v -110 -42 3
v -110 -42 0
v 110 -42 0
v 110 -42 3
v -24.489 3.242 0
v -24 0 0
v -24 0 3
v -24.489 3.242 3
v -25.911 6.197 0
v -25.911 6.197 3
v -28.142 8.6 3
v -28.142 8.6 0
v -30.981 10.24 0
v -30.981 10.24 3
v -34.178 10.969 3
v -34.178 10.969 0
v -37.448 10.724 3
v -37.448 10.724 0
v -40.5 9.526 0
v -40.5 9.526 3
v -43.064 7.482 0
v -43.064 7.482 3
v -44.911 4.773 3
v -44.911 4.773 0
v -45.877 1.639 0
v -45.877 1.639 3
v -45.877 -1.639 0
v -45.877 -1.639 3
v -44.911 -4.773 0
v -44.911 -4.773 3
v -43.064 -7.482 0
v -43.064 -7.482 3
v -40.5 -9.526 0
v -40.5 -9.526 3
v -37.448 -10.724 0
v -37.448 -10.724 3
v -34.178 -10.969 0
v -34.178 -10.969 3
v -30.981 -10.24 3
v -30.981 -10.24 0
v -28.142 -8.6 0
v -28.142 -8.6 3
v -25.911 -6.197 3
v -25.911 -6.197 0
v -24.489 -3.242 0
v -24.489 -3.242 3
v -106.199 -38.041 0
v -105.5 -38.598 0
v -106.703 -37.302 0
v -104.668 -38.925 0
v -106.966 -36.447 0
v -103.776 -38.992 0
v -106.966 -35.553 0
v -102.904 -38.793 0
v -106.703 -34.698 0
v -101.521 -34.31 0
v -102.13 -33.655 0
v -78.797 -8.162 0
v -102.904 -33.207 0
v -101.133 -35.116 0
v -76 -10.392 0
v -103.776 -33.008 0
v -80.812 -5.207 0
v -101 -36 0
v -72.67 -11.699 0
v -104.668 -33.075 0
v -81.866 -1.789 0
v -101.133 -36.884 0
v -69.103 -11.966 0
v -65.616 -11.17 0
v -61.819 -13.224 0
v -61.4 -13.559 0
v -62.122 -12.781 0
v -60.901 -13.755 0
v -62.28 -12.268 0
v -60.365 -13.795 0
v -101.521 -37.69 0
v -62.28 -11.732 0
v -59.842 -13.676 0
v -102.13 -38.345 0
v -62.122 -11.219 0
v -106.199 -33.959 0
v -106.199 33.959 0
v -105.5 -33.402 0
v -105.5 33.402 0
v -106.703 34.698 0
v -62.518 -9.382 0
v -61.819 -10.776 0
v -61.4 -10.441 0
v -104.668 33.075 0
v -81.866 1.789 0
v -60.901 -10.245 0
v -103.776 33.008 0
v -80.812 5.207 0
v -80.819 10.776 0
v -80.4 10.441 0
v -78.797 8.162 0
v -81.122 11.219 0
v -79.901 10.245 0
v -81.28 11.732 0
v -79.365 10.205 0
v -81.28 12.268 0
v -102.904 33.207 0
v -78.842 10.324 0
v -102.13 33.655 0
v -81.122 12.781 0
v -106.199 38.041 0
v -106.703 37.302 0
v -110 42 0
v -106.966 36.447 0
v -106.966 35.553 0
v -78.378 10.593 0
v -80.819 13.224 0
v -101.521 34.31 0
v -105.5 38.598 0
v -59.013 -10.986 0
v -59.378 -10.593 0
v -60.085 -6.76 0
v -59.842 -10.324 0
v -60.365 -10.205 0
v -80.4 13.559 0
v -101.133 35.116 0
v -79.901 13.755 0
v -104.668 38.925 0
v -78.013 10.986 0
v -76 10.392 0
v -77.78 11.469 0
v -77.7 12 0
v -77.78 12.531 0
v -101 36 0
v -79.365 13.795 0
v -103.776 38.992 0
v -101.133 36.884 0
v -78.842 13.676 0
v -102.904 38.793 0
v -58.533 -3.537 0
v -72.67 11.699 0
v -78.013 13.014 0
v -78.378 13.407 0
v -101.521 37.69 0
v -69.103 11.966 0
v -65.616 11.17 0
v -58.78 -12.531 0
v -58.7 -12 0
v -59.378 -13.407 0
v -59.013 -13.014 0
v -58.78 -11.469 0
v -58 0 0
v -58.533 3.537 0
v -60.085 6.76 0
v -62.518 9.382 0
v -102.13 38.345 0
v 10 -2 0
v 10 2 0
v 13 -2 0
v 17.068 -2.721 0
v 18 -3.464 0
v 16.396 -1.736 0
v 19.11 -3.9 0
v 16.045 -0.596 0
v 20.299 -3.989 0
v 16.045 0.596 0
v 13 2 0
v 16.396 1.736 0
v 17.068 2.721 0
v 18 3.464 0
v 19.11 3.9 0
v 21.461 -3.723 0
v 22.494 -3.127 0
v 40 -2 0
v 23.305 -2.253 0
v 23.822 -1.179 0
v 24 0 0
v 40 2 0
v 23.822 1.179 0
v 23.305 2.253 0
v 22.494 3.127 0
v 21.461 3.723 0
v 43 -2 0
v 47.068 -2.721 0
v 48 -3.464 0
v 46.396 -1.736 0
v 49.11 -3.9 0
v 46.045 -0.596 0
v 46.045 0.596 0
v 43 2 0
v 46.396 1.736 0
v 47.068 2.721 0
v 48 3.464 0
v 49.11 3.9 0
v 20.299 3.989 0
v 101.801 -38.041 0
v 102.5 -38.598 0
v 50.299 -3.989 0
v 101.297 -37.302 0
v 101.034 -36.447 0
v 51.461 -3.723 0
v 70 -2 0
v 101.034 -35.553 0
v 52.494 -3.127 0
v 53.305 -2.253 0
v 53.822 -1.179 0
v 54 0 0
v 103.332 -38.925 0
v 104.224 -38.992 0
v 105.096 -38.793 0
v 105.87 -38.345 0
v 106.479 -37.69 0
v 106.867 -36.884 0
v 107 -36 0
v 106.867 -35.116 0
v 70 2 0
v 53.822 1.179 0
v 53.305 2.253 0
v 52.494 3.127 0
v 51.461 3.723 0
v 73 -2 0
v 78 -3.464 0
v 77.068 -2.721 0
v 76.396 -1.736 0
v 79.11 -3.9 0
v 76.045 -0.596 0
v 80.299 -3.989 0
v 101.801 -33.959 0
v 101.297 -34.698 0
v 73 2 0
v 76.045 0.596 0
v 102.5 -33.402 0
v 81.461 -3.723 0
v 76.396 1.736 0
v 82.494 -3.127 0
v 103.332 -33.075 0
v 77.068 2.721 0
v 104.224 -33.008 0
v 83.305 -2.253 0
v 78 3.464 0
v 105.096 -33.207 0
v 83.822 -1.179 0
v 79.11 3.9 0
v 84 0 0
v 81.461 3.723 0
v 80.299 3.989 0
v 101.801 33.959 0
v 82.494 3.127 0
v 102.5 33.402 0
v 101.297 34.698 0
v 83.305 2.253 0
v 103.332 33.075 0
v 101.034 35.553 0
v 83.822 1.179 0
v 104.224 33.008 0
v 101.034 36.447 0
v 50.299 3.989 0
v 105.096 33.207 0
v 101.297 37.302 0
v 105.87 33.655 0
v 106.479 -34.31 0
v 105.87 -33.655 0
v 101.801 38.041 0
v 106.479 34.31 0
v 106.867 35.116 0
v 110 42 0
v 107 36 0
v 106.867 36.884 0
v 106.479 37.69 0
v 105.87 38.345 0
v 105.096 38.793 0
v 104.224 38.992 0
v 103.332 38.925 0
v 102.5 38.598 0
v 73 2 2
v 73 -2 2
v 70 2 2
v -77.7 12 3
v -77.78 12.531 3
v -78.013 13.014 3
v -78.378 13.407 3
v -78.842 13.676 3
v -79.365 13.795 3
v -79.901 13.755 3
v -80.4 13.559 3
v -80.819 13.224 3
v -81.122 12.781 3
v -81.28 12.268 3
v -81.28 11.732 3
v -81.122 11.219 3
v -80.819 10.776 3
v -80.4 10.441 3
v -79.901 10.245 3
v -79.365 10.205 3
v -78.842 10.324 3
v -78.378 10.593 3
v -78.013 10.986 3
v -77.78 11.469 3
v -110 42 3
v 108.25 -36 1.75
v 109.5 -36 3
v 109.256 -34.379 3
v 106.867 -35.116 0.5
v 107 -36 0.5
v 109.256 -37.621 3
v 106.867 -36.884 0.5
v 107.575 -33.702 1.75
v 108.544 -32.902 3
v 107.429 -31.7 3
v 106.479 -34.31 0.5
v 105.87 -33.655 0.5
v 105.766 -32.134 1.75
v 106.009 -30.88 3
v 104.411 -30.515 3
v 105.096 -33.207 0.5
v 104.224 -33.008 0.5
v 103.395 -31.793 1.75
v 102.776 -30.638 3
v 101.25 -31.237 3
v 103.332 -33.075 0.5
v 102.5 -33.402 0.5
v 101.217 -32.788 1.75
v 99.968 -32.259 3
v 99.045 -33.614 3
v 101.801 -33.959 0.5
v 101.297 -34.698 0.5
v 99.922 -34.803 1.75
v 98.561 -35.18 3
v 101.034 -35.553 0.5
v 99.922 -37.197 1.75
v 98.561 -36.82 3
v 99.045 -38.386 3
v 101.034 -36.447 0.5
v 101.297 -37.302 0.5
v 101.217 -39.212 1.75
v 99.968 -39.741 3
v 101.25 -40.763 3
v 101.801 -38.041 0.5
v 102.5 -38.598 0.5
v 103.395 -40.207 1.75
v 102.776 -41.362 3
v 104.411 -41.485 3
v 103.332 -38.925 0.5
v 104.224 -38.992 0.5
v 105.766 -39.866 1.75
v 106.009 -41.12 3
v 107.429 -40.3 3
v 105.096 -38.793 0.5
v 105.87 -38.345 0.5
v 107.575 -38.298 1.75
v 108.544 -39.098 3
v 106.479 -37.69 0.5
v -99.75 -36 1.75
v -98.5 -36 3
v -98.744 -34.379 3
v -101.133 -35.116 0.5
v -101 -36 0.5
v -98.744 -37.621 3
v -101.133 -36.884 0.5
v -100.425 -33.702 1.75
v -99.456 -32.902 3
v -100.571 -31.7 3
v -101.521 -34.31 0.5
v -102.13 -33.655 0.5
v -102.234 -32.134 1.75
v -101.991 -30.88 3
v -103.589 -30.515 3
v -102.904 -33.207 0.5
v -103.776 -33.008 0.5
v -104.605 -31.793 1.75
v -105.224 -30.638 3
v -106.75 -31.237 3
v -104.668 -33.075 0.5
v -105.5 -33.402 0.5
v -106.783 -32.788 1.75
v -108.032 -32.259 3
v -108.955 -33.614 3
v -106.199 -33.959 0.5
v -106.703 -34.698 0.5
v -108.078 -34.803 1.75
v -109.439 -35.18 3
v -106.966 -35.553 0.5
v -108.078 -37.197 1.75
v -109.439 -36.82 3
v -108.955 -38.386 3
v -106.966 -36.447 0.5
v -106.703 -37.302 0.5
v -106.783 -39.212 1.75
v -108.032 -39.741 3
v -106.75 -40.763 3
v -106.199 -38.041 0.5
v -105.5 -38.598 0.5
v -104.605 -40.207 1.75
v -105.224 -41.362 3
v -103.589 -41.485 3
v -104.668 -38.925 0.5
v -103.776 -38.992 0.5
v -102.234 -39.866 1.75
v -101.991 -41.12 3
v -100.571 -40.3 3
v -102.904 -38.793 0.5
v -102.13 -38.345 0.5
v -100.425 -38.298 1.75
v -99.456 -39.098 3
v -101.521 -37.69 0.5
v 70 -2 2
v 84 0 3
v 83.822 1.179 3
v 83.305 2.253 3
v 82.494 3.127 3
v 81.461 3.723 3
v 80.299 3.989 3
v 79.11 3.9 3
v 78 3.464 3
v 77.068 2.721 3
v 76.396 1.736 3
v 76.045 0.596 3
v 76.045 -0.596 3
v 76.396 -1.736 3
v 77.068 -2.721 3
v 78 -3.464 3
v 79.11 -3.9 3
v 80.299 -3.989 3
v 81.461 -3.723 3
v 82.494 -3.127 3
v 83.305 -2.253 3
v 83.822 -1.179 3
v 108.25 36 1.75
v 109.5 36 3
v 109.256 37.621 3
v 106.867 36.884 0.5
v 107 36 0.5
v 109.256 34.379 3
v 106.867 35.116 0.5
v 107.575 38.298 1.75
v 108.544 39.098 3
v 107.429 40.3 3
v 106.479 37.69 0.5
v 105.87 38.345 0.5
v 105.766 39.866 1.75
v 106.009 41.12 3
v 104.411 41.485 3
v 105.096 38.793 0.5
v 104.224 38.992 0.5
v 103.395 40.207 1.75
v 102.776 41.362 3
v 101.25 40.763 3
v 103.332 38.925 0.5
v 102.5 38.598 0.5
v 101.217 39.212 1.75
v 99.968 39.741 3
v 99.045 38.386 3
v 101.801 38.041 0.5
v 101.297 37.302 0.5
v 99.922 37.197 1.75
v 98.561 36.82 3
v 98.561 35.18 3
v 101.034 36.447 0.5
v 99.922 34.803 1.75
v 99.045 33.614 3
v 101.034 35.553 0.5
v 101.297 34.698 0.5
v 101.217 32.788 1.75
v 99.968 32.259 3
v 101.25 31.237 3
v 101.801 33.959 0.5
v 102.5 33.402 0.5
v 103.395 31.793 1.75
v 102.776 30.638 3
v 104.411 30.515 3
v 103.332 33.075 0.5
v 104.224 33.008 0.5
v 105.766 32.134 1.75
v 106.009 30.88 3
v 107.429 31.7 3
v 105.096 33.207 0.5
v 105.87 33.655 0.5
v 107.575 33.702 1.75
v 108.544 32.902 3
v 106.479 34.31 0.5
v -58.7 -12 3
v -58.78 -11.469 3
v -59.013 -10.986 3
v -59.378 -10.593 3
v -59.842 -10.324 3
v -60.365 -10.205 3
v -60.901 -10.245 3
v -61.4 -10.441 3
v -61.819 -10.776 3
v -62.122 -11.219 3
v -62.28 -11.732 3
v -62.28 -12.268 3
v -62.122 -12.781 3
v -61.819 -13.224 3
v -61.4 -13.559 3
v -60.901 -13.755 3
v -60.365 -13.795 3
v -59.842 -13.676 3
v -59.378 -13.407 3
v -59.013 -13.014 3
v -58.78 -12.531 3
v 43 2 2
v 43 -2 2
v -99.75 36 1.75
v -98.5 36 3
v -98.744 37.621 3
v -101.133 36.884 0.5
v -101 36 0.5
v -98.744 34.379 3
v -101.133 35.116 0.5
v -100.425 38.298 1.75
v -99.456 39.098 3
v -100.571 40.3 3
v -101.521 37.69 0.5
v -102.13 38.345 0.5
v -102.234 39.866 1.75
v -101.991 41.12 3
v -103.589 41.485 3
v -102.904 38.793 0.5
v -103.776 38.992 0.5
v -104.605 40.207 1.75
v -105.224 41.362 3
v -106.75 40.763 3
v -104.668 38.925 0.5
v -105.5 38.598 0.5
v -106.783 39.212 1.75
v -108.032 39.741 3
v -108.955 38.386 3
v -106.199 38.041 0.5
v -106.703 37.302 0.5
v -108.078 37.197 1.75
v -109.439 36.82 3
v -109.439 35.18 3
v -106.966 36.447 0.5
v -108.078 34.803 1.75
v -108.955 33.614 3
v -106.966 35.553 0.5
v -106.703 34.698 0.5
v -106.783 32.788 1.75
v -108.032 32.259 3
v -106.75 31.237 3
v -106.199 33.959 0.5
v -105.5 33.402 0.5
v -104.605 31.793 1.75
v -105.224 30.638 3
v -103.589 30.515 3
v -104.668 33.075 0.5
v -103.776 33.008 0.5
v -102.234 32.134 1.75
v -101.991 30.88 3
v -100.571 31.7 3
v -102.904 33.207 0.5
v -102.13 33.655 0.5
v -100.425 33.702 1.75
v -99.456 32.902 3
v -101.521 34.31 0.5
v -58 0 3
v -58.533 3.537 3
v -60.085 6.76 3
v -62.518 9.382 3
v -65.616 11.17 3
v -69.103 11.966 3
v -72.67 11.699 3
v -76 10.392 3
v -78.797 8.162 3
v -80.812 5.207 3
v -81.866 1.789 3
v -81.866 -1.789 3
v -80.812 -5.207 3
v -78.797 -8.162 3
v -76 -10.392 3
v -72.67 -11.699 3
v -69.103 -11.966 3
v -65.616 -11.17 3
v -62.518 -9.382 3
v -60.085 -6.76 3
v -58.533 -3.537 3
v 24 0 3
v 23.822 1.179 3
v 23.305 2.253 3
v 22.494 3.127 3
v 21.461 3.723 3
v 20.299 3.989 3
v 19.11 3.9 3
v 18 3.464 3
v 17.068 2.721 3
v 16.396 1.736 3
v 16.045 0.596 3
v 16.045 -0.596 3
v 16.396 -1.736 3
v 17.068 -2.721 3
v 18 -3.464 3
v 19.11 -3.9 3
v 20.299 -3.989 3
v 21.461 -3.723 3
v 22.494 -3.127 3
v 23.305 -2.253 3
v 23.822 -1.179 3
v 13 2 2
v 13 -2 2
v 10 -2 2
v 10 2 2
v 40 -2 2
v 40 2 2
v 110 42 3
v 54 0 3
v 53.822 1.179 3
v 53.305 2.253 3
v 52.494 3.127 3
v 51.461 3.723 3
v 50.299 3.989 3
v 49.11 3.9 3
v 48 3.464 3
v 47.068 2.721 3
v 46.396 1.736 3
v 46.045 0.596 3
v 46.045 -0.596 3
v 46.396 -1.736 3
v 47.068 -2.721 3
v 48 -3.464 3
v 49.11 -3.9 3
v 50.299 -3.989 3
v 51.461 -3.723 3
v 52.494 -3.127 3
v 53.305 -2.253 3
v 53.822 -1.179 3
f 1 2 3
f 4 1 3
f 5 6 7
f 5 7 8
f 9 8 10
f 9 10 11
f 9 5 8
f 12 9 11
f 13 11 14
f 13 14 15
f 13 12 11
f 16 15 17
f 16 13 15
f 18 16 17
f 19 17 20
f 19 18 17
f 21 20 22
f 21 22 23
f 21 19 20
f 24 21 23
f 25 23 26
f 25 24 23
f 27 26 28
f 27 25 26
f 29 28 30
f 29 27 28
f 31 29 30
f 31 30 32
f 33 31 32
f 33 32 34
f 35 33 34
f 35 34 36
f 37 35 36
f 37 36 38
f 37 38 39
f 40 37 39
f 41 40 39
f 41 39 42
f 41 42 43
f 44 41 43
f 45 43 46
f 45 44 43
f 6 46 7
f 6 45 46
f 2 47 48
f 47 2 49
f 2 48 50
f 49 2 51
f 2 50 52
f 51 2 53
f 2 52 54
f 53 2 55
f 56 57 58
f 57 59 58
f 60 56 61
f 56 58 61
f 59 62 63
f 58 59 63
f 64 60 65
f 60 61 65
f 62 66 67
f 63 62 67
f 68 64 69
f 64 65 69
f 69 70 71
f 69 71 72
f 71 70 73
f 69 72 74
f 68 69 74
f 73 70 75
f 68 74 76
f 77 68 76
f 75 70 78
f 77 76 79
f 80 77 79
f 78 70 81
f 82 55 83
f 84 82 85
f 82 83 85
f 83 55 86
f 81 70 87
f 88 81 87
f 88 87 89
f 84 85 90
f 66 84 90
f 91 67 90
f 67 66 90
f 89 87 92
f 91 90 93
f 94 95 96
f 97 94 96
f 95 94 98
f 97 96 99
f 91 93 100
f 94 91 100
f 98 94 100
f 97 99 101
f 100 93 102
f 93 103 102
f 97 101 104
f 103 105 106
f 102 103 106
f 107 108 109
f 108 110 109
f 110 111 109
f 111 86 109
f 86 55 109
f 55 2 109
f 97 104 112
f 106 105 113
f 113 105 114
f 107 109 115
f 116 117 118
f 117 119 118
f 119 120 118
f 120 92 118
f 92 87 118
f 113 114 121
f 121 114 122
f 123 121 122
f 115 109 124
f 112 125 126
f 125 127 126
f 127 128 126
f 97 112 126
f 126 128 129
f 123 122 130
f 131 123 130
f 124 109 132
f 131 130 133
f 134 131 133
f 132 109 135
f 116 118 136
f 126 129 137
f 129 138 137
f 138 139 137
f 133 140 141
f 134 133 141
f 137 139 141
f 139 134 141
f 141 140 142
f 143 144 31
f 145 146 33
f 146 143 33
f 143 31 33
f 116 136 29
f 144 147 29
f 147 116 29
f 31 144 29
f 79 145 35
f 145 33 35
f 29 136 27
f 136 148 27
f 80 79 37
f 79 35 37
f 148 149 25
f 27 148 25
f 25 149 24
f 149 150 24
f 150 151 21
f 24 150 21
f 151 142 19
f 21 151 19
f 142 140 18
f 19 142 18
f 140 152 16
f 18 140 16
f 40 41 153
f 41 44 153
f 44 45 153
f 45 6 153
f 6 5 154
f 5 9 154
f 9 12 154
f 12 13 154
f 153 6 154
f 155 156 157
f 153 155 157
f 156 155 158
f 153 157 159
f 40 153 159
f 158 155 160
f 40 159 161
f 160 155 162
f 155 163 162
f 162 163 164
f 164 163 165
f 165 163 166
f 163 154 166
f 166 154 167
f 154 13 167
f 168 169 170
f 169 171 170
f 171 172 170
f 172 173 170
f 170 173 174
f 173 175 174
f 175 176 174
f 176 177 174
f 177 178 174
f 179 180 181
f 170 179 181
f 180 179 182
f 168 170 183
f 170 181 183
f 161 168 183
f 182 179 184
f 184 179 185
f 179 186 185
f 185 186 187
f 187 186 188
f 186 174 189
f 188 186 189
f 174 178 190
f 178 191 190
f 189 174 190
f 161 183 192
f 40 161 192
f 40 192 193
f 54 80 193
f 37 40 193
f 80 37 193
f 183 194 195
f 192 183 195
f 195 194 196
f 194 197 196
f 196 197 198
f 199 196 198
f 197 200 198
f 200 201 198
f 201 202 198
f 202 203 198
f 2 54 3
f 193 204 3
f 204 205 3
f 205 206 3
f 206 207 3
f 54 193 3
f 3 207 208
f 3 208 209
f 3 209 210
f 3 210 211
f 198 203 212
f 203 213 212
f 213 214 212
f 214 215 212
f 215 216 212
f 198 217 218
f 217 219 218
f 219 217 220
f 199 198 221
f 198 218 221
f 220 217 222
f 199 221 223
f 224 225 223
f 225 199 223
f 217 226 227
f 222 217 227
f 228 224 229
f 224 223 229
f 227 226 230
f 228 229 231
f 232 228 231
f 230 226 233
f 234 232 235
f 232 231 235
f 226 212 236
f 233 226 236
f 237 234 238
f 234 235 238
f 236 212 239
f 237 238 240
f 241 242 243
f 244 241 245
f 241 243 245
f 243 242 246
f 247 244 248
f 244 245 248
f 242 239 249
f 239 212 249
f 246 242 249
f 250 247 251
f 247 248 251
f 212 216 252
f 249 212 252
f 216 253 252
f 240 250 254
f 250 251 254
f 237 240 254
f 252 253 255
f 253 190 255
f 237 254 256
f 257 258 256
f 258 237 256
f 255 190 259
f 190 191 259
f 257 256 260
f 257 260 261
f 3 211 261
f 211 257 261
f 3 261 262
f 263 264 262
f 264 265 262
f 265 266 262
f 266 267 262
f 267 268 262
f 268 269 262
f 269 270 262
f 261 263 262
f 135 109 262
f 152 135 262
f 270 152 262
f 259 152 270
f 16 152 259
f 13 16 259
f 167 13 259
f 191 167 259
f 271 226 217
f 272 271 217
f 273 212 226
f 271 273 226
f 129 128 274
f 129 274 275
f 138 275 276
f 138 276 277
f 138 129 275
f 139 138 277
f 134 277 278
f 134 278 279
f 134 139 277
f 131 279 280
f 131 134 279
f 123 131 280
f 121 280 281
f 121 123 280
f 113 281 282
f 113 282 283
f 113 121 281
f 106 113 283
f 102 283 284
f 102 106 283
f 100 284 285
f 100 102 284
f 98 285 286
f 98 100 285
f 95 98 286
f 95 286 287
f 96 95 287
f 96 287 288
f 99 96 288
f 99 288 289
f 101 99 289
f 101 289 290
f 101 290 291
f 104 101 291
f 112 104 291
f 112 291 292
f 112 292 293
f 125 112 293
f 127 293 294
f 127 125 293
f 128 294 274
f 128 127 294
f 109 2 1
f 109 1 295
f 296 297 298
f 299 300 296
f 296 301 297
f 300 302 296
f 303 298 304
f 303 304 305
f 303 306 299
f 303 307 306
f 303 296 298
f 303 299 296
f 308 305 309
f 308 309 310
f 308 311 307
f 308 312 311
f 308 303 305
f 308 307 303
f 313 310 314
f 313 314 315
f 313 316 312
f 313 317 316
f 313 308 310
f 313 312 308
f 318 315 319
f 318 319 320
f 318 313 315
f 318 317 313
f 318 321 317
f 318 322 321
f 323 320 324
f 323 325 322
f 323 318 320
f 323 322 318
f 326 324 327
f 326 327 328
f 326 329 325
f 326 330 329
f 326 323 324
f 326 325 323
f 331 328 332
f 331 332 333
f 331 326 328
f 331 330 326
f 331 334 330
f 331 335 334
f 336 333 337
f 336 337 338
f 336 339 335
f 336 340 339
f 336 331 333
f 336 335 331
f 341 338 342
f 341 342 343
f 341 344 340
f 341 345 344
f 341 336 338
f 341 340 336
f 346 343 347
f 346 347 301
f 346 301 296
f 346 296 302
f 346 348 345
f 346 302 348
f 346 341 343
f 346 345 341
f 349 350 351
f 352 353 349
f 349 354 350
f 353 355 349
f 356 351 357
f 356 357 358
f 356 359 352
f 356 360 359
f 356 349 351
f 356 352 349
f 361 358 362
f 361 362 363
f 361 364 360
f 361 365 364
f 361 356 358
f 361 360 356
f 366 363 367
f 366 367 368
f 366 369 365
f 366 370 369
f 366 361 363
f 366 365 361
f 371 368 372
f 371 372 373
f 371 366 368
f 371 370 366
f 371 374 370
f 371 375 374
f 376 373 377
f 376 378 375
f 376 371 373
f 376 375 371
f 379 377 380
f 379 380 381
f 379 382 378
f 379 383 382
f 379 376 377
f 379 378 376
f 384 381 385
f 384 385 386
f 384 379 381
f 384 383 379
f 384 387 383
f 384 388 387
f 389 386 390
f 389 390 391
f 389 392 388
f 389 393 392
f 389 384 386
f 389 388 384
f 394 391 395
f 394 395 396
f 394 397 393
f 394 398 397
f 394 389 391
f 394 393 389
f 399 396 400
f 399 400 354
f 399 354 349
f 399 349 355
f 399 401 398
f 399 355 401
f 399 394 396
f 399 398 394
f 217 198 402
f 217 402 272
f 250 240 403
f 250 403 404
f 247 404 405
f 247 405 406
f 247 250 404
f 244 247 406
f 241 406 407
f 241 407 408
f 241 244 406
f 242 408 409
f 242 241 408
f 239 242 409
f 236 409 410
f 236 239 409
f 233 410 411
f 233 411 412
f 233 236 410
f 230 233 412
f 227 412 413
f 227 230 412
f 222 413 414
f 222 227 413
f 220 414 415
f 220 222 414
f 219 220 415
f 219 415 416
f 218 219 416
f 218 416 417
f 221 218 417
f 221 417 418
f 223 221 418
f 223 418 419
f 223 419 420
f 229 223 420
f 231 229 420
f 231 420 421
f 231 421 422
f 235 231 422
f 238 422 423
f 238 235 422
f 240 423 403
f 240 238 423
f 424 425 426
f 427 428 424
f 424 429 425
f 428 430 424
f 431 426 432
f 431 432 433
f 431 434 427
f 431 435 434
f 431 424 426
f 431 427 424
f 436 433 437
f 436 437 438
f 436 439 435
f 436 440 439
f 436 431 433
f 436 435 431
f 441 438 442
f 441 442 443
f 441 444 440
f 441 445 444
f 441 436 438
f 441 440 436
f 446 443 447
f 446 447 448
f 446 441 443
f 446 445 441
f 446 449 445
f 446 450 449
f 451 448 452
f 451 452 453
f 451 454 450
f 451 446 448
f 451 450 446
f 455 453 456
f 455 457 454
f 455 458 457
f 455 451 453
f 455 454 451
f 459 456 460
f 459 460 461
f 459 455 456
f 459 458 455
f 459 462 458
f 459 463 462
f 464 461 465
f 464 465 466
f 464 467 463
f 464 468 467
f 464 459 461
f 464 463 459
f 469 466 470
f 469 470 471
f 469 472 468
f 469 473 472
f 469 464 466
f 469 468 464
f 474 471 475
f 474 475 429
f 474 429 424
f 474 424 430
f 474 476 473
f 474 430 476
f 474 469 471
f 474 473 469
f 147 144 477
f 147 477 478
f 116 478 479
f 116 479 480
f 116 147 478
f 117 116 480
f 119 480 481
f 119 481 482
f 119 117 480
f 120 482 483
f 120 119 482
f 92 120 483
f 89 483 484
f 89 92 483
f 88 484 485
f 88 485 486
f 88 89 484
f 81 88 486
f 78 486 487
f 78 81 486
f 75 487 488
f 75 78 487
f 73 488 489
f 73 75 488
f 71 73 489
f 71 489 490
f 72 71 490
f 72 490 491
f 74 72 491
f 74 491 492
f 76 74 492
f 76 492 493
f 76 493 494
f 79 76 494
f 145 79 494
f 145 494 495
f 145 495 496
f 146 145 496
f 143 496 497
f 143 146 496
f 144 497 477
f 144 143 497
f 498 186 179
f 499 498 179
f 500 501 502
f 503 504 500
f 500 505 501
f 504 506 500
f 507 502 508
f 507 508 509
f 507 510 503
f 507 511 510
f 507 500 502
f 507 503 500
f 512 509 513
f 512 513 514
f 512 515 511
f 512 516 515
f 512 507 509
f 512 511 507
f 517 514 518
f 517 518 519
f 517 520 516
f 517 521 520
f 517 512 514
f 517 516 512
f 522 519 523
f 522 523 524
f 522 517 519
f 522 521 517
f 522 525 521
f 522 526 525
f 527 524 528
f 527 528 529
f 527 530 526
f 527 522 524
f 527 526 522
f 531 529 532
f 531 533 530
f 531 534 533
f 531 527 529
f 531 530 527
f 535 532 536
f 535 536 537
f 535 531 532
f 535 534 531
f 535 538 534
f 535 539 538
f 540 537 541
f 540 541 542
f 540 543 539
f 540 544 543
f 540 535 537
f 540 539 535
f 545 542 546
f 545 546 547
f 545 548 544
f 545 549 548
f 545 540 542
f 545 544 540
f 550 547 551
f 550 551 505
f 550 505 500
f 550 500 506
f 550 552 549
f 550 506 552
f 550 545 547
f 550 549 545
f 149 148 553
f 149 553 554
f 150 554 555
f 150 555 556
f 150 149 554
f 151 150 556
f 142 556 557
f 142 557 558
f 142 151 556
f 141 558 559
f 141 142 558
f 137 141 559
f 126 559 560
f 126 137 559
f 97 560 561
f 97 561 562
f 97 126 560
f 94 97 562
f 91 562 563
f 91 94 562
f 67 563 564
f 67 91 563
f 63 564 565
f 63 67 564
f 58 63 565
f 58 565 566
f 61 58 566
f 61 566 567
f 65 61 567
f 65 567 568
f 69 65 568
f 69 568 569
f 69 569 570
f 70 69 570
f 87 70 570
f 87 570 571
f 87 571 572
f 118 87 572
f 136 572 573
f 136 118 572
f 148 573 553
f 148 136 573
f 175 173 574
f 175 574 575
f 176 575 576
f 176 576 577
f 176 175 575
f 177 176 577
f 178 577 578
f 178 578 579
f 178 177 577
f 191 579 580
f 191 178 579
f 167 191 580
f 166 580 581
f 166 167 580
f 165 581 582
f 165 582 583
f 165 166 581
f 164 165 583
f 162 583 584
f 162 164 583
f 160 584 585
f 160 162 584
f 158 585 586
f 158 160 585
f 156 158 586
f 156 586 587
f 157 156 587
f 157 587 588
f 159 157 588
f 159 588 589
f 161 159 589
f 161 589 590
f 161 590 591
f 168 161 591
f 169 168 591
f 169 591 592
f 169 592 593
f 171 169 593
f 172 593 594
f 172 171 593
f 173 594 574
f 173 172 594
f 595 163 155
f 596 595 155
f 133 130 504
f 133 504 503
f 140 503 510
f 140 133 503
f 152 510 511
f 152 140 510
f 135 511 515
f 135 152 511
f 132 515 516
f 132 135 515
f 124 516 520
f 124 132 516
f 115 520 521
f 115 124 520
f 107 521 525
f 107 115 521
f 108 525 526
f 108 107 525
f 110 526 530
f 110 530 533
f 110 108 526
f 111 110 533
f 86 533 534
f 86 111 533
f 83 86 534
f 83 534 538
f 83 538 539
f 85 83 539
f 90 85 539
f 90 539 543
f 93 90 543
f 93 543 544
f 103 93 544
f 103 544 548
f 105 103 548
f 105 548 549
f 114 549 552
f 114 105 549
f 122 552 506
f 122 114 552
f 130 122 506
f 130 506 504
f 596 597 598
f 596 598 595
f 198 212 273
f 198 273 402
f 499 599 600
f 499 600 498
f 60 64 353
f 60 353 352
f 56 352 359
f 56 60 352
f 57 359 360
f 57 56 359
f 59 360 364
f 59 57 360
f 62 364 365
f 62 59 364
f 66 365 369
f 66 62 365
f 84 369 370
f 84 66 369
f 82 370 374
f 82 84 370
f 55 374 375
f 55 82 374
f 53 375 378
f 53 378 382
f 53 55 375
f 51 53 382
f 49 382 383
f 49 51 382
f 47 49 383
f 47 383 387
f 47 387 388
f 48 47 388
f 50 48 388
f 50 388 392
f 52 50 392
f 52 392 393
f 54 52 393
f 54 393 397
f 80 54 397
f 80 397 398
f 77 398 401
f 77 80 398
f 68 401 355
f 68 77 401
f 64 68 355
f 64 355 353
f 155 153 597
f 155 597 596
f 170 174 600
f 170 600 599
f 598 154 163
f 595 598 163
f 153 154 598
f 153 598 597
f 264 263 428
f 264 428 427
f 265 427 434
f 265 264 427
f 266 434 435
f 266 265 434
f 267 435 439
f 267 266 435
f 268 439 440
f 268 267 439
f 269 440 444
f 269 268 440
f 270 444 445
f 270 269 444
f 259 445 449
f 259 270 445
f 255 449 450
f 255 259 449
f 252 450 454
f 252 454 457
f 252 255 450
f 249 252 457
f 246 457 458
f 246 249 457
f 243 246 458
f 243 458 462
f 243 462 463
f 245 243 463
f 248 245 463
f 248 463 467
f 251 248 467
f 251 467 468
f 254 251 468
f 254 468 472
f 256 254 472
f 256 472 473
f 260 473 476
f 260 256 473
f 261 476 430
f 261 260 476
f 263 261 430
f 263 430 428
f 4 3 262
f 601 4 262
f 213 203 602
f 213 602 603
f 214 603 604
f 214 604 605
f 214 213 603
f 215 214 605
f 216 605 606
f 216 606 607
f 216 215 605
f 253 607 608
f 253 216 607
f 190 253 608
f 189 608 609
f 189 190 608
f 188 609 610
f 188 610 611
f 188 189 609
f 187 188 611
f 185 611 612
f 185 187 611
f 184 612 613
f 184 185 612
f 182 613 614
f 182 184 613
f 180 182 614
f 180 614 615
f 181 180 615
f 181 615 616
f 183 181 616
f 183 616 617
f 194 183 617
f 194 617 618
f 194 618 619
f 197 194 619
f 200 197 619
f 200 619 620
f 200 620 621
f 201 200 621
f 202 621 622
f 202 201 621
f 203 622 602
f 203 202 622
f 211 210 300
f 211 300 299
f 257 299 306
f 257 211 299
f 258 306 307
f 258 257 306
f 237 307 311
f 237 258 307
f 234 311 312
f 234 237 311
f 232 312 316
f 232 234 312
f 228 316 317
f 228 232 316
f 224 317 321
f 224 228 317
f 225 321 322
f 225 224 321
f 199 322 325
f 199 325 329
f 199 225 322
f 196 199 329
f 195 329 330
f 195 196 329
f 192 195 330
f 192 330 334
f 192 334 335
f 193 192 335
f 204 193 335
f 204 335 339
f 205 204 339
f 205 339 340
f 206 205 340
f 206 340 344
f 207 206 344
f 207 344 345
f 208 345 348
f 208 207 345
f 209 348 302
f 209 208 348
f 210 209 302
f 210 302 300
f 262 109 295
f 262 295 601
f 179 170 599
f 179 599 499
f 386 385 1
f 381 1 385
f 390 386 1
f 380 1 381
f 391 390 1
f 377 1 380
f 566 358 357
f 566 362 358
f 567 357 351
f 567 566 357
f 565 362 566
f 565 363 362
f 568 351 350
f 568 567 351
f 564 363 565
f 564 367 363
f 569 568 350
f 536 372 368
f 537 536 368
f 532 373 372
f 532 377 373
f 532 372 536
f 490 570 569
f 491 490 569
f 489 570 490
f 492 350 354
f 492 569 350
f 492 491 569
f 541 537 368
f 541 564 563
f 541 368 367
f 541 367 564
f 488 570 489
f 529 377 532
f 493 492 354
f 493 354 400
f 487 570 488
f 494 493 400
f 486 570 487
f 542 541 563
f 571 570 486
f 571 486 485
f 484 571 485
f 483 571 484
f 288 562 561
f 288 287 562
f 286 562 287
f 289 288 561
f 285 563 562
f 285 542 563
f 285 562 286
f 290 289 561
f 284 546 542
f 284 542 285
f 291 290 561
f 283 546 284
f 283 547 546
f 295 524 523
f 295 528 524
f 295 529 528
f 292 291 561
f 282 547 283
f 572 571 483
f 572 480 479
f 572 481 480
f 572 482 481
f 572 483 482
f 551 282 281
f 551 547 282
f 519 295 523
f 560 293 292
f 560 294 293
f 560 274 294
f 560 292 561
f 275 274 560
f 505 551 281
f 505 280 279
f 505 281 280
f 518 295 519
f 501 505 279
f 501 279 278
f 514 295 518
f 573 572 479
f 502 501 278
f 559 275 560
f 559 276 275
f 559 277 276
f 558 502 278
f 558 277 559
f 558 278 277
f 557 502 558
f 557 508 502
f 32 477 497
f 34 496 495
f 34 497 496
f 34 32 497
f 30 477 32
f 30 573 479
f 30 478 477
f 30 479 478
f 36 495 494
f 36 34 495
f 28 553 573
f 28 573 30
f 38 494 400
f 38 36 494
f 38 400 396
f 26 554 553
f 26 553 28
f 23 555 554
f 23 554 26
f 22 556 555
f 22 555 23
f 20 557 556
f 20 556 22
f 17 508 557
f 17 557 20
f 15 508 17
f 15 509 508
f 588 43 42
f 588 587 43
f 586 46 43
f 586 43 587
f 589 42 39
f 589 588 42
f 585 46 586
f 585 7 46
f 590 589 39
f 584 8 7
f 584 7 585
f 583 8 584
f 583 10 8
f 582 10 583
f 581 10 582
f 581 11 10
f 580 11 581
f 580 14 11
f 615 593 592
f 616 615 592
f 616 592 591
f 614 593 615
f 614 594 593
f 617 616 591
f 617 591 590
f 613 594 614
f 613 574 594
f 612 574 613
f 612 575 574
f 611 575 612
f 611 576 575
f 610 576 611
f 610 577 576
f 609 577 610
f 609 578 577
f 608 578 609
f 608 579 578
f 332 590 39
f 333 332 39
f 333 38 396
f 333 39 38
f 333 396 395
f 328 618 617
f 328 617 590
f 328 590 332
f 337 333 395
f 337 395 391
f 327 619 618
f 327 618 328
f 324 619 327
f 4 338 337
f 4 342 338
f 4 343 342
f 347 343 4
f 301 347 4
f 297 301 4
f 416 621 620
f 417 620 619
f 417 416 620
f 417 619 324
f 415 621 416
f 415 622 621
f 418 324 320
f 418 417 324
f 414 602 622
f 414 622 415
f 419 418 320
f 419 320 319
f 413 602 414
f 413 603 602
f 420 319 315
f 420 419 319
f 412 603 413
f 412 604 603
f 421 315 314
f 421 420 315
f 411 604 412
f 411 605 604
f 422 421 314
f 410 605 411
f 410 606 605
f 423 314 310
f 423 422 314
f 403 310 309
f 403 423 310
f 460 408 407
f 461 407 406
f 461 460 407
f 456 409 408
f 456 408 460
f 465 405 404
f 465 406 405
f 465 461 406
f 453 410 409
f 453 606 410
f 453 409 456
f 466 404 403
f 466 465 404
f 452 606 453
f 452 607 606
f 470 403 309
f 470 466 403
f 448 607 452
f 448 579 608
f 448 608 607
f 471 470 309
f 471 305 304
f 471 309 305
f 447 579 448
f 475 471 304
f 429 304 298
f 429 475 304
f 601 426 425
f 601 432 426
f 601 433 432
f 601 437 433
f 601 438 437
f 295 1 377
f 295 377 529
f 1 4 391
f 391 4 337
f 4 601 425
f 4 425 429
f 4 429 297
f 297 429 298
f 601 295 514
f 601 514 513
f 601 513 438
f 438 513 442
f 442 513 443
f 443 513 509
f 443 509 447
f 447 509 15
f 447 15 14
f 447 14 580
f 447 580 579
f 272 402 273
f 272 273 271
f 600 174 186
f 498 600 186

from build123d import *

# Parameters (mm, degrees)
SKETCH001_W     = 220
SKETCH001_H     = 84
SKETCH001_R     = 3
SKETCH001_R_2   = 11
SKETCH001_R_3   = 4
SKETCH001_R_4   = 12
SKETCH001_R_5   = 1.8
PAD_DEPTH       = 3
SKETCH_W        = 3
SKETCH_H        = 4
POCKET_DEPTH    = 2
CHAMFER_SIZE    = 2.5
CHAMFER001_SIZE = 2.5
CHAMFER002_SIZE = 2.5
CHAMFER003_SIZE = 2.5


with BuildPart() as part:
    # Sketch001 → Pad (new body)
    with BuildSketch(Plane.XY):
        Rectangle(SKETCH001_W, SKETCH001_H)
        with Locations((-104, -36)):
            Circle(SKETCH001_R, mode=Mode.SUBTRACT)
        with Locations((-104, 36)):
            Circle(SKETCH001_R, mode=Mode.SUBTRACT)
        with Locations((104, 36)):
            Circle(SKETCH001_R, mode=Mode.SUBTRACT)
        with Locations((104, -36)):
            Circle(SKETCH001_R, mode=Mode.SUBTRACT)
        with Locations((-35, 0)):
            Circle(SKETCH001_R_2, mode=Mode.SUBTRACT)
        with Locations((80, 0)):
            Circle(SKETCH001_R_3, mode=Mode.SUBTRACT)
        with Locations((50, 0)):
            Circle(SKETCH001_R_3, mode=Mode.SUBTRACT)
        with Locations((20, 0)):
            Circle(SKETCH001_R_3, mode=Mode.SUBTRACT)
        with Locations((-70, 0)):
            Circle(SKETCH001_R_4, mode=Mode.SUBTRACT)
        with Locations((-79.5, 12)):
            Circle(SKETCH001_R_5, mode=Mode.SUBTRACT)
        with Locations((-60.5, -12)):
            Circle(SKETCH001_R_5, mode=Mode.SUBTRACT)
    extrude(amount=PAD_DEPTH)

    # Sketch (on Face16 of Pad) → Pocket (cut)
    with BuildSketch(Plane(origin=(0, 0, 0), x_dir=(1, 0, 0), z_dir=(0, 0, -1))):
        with Locations((11.5, 0)):
            Rectangle(SKETCH_W, SKETCH_H)
        with Locations((41.5, 0)):
            Rectangle(SKETCH_W, SKETCH_H)
        with Locations((71.5, 0)):
            Rectangle(SKETCH_W, SKETCH_H)
    extrude(amount=-POCKET_DEPTH, mode=Mode.SUBTRACT)

    # Chamfer
    chamfer_edges = [part.edges().sort_by_distance(p)[0] for p in [
        (-107, -36, 3),
    ]]
    chamfer(chamfer_edges, length=CHAMFER_SIZE)

    # Chamfer001
    chamfer001_edges = [part.edges().sort_by_distance(p)[0] for p in [
        (-107, 36, 3),
    ]]
    chamfer(chamfer001_edges, length=CHAMFER001_SIZE)

    # Chamfer002
    chamfer002_edges = [part.edges().sort_by_distance(p)[0] for p in [
        (101, 36, 3),
    ]]
    chamfer(chamfer002_edges, length=CHAMFER002_SIZE)

    # Chamfer003
    chamfer003_edges = [part.edges().sort_by_distance(p)[0] for p in [
        (101, -36, 3),
    ]]
    chamfer(chamfer003_edges, length=CHAMFER003_SIZE)


solid = part.part
